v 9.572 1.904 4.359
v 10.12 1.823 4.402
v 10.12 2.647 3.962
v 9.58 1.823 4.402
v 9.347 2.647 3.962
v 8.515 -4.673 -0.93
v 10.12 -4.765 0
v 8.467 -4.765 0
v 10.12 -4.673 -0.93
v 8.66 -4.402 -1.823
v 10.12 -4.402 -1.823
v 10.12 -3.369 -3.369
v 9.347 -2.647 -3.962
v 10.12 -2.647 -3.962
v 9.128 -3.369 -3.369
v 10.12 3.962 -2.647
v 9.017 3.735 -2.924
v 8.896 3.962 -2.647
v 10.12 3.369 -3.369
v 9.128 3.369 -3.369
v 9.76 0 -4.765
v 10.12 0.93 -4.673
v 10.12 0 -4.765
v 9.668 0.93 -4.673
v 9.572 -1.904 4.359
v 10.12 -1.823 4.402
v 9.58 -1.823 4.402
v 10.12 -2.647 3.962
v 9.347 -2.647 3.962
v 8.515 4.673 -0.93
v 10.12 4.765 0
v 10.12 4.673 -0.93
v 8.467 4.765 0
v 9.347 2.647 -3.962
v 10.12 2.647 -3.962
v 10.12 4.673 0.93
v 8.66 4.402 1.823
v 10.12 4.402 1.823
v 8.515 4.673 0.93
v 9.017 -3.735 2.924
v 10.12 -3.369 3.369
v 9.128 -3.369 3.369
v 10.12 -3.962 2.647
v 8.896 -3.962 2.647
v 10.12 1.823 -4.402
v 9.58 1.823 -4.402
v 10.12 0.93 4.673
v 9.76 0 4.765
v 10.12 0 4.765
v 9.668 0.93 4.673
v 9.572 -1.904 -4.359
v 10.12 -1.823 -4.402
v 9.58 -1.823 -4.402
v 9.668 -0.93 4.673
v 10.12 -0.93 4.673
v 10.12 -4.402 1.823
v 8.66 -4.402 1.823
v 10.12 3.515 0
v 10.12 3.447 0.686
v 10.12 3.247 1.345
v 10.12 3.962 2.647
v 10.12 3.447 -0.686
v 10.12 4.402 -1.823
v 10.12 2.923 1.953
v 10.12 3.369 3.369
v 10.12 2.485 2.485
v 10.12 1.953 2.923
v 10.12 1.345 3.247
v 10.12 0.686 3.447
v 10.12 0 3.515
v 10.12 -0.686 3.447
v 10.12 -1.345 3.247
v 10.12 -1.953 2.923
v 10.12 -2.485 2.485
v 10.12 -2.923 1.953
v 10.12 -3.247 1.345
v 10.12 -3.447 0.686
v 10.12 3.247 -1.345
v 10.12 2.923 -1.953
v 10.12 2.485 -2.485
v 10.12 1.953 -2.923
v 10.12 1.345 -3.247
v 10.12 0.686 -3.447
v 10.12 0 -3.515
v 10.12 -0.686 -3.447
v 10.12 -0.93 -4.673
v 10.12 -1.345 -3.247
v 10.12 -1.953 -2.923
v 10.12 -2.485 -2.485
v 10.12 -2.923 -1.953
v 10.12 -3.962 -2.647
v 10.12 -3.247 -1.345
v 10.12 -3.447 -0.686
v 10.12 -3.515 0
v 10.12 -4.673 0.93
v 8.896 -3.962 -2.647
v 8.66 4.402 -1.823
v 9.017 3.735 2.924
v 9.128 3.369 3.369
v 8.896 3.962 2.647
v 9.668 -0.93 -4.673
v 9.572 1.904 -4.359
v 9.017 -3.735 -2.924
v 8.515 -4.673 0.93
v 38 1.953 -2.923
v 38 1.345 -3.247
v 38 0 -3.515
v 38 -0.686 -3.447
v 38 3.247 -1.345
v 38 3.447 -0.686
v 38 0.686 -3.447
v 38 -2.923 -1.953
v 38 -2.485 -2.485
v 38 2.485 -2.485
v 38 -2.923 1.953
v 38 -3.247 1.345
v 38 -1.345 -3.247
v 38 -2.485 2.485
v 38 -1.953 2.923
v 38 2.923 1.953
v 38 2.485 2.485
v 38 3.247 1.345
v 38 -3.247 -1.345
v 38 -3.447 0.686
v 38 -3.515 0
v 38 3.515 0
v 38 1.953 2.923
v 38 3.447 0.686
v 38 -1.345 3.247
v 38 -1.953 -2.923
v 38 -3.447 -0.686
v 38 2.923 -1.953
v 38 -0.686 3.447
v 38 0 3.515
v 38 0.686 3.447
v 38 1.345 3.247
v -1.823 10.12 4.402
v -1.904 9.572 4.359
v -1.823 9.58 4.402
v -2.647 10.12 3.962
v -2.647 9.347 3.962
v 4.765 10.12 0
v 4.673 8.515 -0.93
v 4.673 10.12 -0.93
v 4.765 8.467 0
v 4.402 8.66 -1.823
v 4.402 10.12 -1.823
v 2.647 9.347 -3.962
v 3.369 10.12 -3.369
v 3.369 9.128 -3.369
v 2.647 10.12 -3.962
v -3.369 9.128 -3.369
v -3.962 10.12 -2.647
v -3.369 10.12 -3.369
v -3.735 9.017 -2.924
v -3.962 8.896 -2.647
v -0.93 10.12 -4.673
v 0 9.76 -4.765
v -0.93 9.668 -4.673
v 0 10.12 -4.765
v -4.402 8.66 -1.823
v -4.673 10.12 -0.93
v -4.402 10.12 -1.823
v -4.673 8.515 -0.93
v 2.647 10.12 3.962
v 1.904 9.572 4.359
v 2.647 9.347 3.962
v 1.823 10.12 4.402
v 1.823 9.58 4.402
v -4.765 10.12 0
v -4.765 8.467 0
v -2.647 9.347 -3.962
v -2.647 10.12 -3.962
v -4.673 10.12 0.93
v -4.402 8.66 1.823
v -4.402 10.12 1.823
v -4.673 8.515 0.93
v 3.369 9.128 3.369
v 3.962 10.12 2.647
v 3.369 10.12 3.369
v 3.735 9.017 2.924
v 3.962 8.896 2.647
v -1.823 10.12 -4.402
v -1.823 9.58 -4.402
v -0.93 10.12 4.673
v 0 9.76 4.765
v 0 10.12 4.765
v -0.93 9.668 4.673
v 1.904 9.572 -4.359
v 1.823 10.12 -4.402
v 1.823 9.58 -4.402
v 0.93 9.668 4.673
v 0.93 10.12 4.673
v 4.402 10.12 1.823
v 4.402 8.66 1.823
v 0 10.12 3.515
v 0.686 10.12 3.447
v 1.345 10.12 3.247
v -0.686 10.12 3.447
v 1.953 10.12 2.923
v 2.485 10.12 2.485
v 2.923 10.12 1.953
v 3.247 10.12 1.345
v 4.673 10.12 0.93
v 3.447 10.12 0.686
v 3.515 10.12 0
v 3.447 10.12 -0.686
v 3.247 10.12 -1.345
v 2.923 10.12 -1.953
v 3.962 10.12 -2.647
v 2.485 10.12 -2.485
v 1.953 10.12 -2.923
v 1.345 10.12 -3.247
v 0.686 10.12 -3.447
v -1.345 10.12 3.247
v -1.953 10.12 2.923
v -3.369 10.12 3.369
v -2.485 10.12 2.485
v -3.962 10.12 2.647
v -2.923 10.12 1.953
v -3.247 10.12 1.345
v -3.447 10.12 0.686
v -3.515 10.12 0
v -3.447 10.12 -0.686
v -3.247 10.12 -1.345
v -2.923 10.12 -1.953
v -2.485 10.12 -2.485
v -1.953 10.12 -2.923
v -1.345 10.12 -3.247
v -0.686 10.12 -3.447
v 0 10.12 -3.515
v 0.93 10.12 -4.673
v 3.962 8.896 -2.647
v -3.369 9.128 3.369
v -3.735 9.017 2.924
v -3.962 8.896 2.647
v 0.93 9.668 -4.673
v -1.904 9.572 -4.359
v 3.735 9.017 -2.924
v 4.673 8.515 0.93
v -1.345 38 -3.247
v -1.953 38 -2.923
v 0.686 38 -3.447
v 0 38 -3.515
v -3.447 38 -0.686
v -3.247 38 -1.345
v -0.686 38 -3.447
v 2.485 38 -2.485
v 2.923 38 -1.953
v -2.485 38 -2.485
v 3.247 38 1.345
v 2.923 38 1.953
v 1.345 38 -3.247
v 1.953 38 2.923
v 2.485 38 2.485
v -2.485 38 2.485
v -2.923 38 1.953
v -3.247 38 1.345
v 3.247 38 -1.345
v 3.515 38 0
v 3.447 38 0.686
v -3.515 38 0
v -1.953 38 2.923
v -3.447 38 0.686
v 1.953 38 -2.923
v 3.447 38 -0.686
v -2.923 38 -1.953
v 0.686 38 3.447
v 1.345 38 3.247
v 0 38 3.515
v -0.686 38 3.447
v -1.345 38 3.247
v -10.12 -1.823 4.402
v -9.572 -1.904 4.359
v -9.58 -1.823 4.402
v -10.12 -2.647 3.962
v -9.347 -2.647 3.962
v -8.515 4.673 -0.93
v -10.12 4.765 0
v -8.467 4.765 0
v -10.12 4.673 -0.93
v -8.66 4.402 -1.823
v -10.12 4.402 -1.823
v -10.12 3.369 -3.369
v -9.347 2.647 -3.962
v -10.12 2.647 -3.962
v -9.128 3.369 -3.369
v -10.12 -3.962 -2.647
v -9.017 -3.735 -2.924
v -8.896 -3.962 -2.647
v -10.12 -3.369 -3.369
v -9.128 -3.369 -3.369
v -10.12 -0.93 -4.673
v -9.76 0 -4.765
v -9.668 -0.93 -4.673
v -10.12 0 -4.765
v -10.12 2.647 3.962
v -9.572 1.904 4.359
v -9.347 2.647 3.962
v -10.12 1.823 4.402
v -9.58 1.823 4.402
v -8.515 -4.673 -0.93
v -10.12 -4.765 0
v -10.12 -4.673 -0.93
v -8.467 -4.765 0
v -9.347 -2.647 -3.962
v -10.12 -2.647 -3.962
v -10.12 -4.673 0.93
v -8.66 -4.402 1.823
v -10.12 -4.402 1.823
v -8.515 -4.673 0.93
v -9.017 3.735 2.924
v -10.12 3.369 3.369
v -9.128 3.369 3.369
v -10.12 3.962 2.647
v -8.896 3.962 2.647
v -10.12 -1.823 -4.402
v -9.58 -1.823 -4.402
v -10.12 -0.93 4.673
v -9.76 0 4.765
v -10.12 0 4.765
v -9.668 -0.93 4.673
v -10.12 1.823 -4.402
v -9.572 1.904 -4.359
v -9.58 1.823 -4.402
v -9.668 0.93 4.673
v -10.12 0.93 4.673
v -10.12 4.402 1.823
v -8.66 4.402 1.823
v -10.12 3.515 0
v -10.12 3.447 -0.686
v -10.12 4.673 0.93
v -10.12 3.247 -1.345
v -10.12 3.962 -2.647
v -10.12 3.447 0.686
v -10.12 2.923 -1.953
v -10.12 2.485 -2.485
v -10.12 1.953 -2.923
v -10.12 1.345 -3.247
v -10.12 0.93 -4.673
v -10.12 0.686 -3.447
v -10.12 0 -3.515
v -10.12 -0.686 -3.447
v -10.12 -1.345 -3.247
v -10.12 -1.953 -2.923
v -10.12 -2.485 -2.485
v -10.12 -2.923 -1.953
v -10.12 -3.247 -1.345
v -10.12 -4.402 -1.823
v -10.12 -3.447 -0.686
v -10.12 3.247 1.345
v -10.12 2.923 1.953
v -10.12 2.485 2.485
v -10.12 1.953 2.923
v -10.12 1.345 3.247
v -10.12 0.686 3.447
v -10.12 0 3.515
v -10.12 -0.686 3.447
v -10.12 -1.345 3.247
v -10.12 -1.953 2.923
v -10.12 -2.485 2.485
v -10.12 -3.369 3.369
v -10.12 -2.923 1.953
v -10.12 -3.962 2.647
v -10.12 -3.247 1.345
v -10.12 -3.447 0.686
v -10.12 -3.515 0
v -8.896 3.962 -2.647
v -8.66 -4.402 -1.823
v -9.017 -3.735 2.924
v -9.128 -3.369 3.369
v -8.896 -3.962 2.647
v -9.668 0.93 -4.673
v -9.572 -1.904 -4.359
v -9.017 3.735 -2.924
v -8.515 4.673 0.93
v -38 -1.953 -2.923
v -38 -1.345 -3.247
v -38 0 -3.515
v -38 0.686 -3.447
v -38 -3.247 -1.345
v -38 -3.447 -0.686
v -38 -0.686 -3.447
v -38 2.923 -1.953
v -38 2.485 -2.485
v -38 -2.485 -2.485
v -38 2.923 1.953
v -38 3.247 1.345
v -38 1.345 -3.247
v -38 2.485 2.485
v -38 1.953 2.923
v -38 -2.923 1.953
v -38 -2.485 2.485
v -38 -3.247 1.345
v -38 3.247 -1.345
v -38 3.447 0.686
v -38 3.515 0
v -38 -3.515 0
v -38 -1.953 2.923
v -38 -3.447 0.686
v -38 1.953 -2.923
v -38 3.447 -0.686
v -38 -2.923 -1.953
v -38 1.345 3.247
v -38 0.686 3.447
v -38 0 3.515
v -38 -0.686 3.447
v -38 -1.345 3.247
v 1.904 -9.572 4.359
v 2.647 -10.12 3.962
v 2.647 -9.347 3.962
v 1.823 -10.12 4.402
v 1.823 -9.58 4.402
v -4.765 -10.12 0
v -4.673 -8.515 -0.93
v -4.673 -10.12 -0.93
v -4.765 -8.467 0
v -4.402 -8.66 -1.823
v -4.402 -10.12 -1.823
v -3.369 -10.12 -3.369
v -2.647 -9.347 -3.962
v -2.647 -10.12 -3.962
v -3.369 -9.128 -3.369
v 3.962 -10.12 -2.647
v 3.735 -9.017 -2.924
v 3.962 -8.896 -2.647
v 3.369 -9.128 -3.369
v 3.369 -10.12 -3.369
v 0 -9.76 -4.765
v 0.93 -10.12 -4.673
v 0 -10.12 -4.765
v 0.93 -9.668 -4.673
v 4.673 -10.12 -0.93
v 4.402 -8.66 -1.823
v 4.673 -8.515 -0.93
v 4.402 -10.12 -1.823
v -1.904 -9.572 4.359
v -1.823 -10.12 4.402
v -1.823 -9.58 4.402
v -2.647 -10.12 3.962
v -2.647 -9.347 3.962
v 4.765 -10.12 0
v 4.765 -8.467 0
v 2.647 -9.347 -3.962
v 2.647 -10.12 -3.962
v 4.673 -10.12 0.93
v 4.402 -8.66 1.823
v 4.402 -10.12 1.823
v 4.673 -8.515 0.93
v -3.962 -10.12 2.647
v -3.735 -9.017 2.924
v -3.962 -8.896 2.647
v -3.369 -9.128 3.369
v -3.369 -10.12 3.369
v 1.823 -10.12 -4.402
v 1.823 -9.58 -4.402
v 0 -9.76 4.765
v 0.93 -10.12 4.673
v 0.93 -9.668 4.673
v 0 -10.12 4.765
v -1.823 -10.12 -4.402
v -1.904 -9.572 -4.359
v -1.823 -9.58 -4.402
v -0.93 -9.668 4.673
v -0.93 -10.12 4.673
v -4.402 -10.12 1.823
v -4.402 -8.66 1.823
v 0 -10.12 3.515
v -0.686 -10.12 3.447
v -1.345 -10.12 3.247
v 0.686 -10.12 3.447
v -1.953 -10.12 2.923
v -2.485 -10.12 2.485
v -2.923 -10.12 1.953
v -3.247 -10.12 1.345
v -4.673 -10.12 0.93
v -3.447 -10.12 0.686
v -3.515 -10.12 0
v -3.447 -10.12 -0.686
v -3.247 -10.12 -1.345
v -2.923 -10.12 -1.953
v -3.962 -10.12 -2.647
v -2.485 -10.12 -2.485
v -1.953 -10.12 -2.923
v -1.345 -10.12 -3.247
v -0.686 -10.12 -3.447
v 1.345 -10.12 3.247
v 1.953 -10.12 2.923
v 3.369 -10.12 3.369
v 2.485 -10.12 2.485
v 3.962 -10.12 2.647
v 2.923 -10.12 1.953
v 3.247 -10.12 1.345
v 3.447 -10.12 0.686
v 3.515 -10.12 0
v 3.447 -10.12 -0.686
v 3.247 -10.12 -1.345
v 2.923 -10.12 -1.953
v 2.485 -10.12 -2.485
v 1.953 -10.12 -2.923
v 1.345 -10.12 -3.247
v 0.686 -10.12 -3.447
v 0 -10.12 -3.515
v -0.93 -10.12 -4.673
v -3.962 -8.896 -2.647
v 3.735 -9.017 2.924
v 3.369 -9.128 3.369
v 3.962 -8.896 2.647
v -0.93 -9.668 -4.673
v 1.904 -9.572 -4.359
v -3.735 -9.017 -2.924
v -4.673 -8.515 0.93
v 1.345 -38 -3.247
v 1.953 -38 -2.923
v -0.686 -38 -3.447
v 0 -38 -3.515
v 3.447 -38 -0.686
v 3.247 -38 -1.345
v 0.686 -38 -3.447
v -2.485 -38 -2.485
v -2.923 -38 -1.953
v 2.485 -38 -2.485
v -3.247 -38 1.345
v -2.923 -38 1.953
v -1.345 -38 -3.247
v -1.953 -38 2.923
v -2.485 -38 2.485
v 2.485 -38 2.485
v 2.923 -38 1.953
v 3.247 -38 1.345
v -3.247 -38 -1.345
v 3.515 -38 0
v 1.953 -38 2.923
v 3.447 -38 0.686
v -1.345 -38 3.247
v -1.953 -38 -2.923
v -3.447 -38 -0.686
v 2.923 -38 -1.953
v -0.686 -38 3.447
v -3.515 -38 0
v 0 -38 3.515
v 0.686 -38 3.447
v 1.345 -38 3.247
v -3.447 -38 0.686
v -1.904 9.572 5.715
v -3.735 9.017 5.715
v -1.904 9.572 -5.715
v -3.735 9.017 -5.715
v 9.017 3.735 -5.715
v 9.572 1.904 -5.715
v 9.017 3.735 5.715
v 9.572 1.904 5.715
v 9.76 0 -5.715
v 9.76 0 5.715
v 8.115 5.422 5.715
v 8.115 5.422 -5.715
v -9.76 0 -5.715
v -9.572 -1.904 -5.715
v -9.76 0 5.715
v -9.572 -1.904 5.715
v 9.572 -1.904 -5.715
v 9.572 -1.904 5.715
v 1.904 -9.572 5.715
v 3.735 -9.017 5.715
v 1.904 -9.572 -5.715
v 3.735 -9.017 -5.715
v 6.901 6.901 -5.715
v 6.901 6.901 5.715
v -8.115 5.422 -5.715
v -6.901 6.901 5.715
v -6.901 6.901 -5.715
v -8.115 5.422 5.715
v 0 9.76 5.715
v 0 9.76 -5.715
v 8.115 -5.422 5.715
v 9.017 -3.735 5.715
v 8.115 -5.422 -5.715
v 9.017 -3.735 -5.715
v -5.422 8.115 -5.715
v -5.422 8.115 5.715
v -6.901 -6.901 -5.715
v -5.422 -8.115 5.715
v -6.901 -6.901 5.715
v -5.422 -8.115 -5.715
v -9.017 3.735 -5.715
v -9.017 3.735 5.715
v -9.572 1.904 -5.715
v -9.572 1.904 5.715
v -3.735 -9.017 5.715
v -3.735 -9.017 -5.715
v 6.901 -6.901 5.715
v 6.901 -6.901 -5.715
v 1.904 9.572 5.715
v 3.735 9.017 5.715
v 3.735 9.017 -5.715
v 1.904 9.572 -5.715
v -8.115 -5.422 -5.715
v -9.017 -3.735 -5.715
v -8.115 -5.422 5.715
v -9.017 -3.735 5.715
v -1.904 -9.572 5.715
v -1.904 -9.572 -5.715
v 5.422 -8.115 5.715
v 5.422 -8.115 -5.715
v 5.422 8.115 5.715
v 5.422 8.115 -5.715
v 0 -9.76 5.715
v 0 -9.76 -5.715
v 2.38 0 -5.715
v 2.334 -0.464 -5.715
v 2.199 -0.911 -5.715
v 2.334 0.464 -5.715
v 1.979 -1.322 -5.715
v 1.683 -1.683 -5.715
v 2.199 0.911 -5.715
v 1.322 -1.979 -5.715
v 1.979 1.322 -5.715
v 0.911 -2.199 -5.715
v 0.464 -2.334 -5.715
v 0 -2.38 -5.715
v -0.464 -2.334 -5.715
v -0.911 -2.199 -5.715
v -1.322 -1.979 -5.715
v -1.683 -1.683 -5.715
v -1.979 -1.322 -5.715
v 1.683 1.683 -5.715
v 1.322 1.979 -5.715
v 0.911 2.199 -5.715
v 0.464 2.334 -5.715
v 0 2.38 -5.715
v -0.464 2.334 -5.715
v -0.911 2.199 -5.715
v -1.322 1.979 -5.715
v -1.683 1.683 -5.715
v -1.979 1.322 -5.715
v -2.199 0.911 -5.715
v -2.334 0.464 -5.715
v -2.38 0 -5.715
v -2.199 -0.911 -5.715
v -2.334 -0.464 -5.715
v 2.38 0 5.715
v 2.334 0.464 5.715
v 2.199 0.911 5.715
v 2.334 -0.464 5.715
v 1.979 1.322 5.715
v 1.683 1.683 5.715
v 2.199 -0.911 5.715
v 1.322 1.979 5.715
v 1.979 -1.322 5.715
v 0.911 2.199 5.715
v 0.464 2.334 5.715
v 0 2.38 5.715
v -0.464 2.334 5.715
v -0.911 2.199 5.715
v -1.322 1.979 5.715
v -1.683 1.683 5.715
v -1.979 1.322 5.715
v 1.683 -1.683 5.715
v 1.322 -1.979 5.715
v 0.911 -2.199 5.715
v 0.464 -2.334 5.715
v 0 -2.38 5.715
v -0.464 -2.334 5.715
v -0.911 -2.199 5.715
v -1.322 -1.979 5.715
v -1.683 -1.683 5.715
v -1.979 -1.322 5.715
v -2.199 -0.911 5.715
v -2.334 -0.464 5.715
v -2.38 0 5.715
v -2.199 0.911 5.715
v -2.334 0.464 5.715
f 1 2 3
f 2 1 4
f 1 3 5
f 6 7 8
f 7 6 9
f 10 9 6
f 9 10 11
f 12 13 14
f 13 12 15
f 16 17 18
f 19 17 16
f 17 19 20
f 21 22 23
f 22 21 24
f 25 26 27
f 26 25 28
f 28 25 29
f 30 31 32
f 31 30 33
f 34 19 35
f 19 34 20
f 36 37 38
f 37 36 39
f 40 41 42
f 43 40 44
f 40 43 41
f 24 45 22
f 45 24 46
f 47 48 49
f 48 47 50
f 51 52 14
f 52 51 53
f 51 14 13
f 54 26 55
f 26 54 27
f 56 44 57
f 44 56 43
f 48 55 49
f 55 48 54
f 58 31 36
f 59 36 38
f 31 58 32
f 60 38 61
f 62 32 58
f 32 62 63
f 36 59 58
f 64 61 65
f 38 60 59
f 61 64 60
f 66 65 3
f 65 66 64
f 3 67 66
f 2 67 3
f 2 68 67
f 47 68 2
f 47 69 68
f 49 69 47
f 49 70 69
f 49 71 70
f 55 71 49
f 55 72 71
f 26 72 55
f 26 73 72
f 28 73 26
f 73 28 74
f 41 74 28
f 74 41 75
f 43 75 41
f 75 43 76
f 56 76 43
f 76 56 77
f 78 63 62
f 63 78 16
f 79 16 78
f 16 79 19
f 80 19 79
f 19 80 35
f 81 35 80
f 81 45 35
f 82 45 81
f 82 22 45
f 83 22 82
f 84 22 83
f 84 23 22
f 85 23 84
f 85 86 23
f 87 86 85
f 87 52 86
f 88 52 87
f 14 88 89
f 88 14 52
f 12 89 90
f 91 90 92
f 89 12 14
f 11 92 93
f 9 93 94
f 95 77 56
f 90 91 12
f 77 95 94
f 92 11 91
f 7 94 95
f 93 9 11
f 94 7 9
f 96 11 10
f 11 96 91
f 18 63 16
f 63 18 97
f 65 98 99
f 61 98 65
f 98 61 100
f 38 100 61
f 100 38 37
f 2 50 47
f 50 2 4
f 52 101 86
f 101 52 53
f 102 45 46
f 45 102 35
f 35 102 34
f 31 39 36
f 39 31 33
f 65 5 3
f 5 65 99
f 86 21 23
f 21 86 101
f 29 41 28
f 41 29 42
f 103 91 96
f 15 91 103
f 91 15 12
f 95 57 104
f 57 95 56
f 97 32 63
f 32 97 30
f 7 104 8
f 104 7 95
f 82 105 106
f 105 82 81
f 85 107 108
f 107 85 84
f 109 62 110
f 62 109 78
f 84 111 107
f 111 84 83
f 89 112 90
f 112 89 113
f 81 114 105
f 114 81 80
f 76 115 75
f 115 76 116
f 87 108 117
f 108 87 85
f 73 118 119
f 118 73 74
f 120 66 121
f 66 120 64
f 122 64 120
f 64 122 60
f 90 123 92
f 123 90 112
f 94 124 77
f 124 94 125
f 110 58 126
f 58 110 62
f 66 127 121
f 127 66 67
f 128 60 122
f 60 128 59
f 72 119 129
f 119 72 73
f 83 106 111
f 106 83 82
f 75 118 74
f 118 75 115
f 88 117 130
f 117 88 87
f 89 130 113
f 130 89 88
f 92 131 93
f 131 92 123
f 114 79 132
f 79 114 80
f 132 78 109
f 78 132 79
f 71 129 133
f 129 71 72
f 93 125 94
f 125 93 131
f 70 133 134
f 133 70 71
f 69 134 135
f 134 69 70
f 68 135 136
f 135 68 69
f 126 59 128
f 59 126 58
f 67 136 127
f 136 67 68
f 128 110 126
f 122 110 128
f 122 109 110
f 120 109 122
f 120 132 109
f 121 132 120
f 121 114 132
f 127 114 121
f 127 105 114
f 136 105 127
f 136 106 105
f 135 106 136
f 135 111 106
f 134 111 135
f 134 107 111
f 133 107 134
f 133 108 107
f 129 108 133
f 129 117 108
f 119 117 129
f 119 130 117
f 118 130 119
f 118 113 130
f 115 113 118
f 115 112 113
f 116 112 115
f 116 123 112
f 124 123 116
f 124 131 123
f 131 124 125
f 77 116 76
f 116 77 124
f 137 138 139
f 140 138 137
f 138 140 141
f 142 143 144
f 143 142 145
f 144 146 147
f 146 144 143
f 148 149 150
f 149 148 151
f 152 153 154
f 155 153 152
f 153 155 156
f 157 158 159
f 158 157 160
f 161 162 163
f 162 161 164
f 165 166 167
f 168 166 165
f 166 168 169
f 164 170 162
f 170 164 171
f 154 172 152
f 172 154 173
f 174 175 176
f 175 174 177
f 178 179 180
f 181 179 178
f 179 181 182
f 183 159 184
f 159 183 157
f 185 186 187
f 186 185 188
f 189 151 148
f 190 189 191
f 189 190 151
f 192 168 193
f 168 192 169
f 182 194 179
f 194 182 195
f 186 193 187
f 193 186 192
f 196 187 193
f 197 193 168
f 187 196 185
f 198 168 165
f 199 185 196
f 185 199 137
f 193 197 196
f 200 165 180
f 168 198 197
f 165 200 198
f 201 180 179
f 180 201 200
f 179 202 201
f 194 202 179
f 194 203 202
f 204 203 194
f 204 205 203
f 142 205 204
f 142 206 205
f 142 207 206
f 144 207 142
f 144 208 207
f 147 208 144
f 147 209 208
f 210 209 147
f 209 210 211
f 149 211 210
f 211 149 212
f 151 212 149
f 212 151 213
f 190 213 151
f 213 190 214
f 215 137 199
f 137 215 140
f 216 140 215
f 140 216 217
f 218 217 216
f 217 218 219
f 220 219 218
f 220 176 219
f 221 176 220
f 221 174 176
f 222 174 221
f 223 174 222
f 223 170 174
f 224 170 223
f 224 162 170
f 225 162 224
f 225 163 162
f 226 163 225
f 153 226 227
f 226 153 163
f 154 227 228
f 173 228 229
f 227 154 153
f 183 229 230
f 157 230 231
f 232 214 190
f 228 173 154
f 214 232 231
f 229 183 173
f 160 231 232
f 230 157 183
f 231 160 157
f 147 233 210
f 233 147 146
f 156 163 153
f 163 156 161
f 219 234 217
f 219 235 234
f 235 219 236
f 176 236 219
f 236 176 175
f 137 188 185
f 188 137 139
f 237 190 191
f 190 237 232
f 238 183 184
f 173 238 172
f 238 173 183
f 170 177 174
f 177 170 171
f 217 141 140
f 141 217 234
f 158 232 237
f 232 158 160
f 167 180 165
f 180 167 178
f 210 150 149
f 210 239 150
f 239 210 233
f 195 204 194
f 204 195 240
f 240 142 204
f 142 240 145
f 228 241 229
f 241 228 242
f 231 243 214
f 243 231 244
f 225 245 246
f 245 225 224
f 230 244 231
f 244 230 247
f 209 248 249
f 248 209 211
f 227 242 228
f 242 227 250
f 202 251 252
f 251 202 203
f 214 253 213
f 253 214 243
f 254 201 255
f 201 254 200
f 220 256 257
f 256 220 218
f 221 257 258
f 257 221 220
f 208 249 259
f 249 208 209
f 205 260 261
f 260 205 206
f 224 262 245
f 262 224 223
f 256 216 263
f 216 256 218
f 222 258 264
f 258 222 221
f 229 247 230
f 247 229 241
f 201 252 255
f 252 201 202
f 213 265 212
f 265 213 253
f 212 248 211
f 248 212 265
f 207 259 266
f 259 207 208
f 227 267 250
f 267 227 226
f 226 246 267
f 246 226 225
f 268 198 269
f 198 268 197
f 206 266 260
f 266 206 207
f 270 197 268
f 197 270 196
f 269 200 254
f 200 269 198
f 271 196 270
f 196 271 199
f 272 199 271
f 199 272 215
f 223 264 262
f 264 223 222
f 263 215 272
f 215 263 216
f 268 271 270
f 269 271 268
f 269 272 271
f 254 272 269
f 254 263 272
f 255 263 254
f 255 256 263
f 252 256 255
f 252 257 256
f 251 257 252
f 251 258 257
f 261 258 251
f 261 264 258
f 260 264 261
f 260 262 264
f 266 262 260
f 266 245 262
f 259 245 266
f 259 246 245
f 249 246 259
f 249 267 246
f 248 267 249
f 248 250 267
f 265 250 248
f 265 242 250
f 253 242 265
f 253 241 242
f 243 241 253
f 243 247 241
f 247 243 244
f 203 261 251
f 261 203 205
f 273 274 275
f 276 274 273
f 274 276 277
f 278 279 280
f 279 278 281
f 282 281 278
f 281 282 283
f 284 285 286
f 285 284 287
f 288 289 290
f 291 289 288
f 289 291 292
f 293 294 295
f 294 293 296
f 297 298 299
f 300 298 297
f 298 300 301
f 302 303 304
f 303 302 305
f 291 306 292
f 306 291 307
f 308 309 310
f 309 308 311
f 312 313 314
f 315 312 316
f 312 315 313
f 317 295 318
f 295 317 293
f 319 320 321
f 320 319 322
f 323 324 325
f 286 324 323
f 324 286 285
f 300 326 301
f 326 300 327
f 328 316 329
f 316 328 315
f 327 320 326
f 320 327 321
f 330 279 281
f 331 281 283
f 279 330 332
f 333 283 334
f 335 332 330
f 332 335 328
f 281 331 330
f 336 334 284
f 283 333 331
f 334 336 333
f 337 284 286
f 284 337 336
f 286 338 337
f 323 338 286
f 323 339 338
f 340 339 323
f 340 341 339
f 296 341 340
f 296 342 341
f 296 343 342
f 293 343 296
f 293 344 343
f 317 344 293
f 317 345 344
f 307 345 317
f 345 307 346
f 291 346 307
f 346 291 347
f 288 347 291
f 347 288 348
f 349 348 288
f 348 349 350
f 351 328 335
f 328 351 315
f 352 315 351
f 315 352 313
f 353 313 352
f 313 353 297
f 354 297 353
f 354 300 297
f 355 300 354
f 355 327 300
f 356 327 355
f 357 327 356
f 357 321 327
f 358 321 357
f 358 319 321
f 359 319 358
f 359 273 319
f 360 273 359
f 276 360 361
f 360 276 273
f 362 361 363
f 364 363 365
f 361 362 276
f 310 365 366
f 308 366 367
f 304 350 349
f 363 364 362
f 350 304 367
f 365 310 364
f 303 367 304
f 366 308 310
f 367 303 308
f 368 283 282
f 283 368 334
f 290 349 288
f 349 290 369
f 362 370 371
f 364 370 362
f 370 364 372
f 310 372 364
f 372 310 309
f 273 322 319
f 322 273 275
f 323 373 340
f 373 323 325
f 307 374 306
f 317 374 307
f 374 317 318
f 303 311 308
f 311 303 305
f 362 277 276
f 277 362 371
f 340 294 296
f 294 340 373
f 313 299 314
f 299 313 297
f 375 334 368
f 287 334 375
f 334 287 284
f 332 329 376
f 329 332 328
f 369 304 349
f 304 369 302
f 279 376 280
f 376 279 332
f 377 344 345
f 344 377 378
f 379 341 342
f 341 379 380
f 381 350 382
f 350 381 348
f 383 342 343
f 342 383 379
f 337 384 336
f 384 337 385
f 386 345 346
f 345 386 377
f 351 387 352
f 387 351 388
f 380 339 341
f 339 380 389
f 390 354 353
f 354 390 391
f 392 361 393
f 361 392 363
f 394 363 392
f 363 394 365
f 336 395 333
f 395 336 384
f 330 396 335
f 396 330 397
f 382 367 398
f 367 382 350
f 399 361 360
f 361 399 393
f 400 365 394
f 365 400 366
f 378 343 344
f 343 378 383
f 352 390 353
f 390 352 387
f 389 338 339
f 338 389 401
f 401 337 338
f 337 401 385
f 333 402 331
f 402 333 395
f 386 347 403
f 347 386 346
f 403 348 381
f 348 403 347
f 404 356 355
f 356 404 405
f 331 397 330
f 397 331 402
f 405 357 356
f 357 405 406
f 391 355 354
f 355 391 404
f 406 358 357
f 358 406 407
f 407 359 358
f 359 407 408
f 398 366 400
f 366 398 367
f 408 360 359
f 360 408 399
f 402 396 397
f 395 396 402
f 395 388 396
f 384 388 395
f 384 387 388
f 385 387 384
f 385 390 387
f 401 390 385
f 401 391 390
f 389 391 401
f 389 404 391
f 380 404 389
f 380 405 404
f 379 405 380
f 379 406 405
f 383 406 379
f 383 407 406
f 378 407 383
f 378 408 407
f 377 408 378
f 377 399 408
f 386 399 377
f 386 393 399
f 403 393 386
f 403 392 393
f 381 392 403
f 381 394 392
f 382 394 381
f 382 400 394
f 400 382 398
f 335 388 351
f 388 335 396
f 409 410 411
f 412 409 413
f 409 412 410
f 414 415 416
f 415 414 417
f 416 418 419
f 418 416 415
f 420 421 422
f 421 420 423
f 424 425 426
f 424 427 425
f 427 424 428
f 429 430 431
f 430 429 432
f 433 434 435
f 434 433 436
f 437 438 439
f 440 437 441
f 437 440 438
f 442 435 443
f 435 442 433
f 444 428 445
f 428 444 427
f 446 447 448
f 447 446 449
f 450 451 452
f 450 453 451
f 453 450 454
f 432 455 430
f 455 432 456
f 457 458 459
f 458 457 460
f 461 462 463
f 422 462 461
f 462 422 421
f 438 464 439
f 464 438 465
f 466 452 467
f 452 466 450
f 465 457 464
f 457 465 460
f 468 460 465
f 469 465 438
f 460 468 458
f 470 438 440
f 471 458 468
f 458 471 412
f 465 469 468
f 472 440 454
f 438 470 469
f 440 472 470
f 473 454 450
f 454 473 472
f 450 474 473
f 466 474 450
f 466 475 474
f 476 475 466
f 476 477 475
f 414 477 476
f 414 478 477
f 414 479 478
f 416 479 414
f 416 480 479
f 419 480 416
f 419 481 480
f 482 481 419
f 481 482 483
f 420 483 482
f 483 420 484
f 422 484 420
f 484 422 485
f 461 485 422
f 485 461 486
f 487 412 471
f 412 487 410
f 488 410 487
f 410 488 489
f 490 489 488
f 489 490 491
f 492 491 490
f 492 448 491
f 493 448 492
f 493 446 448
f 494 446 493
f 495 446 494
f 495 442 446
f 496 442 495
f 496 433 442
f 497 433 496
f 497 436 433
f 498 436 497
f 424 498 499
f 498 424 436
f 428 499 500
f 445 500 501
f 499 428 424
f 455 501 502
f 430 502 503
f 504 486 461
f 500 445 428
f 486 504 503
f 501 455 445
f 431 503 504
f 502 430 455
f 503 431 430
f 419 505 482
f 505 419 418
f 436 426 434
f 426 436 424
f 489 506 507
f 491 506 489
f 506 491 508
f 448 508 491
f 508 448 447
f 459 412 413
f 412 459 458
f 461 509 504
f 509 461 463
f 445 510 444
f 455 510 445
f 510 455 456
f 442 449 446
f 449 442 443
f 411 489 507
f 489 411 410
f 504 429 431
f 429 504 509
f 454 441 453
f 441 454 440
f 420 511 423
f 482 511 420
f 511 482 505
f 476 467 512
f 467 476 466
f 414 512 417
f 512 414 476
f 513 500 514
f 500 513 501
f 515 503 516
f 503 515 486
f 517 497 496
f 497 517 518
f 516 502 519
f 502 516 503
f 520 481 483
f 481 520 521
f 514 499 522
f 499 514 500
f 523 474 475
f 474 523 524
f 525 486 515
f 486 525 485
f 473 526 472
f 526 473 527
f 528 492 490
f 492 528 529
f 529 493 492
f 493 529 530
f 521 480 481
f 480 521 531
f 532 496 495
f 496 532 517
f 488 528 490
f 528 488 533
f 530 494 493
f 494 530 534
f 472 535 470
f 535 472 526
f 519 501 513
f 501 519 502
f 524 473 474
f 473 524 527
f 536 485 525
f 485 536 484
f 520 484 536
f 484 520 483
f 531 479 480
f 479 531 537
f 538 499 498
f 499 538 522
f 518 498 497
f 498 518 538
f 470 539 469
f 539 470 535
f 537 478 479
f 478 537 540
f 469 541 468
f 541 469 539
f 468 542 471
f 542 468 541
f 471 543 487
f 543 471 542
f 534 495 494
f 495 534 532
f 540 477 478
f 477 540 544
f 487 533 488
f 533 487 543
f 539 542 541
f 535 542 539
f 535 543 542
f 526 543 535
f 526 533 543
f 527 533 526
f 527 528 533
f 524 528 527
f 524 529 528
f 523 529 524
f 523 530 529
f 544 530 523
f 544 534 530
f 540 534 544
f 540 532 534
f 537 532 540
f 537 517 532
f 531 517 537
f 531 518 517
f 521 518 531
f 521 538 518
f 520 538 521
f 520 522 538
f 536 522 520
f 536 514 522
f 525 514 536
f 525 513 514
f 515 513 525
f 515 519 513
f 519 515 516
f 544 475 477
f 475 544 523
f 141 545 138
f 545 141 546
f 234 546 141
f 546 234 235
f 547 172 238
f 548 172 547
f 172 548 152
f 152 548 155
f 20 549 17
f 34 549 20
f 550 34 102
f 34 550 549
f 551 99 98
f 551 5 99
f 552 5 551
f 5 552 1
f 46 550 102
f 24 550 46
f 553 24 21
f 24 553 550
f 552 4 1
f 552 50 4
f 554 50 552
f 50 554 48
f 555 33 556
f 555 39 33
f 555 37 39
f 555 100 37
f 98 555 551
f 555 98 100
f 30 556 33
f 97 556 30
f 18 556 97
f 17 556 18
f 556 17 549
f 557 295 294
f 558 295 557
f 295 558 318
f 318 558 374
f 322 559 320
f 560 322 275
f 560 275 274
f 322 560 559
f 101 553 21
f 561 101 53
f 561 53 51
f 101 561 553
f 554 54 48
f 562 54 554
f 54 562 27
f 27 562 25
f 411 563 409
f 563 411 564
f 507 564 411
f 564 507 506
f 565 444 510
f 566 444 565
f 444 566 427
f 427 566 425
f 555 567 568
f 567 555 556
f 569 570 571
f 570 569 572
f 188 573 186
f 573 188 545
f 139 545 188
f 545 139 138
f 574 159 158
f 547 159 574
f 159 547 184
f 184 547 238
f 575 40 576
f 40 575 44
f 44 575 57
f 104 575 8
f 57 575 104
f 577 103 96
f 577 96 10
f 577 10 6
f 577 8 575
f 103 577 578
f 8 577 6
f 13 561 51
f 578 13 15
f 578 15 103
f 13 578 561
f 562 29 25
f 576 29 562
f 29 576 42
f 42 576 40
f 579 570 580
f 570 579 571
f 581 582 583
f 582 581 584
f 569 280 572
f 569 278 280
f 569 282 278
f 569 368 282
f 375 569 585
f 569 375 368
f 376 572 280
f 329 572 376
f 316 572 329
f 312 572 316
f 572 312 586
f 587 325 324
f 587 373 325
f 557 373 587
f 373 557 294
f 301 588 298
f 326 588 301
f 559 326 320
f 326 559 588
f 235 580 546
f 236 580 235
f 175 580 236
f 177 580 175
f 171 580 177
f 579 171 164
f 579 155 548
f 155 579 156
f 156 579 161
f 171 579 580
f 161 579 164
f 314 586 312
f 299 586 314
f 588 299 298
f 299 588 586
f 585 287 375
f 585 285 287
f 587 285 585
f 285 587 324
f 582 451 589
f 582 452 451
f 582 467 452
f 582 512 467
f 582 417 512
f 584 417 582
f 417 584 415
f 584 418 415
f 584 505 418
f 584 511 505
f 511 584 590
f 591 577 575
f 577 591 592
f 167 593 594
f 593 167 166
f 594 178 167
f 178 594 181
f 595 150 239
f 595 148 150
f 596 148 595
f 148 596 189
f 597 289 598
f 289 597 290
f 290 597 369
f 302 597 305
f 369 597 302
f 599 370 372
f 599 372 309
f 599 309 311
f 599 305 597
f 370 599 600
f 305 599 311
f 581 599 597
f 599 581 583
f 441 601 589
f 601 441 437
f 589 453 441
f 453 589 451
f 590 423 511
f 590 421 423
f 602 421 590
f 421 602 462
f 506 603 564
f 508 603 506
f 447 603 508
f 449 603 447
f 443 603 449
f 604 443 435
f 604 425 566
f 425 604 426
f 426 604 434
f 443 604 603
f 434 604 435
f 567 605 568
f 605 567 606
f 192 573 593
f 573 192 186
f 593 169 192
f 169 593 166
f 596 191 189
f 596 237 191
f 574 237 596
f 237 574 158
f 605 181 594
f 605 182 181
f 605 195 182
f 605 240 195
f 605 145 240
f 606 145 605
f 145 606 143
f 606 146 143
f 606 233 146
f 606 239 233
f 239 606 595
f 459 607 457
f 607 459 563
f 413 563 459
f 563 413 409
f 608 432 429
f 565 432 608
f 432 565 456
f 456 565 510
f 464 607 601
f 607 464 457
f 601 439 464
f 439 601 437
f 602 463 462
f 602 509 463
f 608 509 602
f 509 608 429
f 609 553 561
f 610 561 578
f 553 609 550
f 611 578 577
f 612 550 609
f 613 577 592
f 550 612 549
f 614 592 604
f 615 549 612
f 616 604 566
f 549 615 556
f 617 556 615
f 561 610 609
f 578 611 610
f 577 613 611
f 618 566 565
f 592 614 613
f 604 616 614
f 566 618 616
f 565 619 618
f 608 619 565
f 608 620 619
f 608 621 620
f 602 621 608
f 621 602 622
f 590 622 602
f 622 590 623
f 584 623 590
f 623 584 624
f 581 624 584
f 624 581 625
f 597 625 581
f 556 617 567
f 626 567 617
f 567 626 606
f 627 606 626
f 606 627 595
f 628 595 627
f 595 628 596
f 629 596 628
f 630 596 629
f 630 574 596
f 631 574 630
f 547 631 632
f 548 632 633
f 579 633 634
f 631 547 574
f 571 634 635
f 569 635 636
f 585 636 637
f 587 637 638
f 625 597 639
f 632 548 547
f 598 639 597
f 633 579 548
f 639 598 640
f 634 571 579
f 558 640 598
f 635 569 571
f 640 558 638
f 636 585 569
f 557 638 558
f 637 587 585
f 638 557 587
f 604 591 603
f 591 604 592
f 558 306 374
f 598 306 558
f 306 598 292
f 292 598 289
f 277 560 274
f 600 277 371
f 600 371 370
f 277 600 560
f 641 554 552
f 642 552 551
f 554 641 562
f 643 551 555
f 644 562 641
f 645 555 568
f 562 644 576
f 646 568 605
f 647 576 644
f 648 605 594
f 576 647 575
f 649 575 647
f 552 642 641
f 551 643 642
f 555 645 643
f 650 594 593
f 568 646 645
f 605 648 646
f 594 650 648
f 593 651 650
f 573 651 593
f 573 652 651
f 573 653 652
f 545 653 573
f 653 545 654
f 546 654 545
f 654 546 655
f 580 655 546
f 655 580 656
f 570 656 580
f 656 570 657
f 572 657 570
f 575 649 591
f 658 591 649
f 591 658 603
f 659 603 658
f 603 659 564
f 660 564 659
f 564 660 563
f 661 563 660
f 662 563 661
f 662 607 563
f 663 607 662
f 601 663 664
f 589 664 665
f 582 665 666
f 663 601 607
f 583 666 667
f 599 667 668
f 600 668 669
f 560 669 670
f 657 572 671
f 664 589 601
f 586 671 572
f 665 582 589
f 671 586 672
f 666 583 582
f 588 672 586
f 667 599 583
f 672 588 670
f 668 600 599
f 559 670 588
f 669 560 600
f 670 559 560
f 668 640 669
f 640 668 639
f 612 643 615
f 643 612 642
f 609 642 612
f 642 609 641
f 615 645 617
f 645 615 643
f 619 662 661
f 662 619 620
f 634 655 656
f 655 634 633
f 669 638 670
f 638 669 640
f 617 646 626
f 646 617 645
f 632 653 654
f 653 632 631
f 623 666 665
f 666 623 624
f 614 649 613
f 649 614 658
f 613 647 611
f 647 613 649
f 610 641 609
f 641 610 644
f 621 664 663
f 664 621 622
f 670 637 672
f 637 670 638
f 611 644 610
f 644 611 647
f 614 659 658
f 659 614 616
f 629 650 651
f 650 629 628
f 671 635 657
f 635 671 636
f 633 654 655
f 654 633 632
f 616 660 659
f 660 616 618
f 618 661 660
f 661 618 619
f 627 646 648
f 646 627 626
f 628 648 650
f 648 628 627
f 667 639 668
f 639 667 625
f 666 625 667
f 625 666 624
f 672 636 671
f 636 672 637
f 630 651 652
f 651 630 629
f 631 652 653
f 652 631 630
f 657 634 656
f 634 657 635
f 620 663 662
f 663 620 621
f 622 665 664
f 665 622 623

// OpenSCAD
$fn = 32;

// ----------------------------------------------------------------------
// Cardan cross: 76 mm span, 9.53 mm trunnions
// ----------------------------------------------------------------------

// --- parameters (mm) ---
journal_d = 9.53;         // trunnion diameter
arm_len = 38;             // trunnion length from the centre
step_r = 3.24;            // step position from the centre
step_d = 7.03;            // journal diameter after the step
hub_d = 19.52;            // hub diameter
hub_h = 11.43;            // hub height
bore_d = 4.76;            // hub bore

difference() {
  union() {
    /* hub along the joint axis */
    cylinder(h = hub_h, d = hub_d, center = true);
    for (a = [0 : 90 : 270]) rotate([0, 0, a]) {
      /* trunnion, sunk into the hub */
      translate([hub_d / 4, 0, 0]) rotate([0, 90, 0]) cylinder(h = step_r + 2, d = journal_d);
      /* stepped journal out to the tip */
      translate([step_r - 0.5, 0, 0]) rotate([0, 90, 0]) cylinder(h = arm_len + 0.5 - step_r, d = step_d);
    }
  }
  /* lubrication bore through the hub, 2.5 mm clear on both sides */
  translate([0, 0, -hub_h / 2 - 2.5]) cylinder(h = hub_h + 5, d = bore_d);
}
